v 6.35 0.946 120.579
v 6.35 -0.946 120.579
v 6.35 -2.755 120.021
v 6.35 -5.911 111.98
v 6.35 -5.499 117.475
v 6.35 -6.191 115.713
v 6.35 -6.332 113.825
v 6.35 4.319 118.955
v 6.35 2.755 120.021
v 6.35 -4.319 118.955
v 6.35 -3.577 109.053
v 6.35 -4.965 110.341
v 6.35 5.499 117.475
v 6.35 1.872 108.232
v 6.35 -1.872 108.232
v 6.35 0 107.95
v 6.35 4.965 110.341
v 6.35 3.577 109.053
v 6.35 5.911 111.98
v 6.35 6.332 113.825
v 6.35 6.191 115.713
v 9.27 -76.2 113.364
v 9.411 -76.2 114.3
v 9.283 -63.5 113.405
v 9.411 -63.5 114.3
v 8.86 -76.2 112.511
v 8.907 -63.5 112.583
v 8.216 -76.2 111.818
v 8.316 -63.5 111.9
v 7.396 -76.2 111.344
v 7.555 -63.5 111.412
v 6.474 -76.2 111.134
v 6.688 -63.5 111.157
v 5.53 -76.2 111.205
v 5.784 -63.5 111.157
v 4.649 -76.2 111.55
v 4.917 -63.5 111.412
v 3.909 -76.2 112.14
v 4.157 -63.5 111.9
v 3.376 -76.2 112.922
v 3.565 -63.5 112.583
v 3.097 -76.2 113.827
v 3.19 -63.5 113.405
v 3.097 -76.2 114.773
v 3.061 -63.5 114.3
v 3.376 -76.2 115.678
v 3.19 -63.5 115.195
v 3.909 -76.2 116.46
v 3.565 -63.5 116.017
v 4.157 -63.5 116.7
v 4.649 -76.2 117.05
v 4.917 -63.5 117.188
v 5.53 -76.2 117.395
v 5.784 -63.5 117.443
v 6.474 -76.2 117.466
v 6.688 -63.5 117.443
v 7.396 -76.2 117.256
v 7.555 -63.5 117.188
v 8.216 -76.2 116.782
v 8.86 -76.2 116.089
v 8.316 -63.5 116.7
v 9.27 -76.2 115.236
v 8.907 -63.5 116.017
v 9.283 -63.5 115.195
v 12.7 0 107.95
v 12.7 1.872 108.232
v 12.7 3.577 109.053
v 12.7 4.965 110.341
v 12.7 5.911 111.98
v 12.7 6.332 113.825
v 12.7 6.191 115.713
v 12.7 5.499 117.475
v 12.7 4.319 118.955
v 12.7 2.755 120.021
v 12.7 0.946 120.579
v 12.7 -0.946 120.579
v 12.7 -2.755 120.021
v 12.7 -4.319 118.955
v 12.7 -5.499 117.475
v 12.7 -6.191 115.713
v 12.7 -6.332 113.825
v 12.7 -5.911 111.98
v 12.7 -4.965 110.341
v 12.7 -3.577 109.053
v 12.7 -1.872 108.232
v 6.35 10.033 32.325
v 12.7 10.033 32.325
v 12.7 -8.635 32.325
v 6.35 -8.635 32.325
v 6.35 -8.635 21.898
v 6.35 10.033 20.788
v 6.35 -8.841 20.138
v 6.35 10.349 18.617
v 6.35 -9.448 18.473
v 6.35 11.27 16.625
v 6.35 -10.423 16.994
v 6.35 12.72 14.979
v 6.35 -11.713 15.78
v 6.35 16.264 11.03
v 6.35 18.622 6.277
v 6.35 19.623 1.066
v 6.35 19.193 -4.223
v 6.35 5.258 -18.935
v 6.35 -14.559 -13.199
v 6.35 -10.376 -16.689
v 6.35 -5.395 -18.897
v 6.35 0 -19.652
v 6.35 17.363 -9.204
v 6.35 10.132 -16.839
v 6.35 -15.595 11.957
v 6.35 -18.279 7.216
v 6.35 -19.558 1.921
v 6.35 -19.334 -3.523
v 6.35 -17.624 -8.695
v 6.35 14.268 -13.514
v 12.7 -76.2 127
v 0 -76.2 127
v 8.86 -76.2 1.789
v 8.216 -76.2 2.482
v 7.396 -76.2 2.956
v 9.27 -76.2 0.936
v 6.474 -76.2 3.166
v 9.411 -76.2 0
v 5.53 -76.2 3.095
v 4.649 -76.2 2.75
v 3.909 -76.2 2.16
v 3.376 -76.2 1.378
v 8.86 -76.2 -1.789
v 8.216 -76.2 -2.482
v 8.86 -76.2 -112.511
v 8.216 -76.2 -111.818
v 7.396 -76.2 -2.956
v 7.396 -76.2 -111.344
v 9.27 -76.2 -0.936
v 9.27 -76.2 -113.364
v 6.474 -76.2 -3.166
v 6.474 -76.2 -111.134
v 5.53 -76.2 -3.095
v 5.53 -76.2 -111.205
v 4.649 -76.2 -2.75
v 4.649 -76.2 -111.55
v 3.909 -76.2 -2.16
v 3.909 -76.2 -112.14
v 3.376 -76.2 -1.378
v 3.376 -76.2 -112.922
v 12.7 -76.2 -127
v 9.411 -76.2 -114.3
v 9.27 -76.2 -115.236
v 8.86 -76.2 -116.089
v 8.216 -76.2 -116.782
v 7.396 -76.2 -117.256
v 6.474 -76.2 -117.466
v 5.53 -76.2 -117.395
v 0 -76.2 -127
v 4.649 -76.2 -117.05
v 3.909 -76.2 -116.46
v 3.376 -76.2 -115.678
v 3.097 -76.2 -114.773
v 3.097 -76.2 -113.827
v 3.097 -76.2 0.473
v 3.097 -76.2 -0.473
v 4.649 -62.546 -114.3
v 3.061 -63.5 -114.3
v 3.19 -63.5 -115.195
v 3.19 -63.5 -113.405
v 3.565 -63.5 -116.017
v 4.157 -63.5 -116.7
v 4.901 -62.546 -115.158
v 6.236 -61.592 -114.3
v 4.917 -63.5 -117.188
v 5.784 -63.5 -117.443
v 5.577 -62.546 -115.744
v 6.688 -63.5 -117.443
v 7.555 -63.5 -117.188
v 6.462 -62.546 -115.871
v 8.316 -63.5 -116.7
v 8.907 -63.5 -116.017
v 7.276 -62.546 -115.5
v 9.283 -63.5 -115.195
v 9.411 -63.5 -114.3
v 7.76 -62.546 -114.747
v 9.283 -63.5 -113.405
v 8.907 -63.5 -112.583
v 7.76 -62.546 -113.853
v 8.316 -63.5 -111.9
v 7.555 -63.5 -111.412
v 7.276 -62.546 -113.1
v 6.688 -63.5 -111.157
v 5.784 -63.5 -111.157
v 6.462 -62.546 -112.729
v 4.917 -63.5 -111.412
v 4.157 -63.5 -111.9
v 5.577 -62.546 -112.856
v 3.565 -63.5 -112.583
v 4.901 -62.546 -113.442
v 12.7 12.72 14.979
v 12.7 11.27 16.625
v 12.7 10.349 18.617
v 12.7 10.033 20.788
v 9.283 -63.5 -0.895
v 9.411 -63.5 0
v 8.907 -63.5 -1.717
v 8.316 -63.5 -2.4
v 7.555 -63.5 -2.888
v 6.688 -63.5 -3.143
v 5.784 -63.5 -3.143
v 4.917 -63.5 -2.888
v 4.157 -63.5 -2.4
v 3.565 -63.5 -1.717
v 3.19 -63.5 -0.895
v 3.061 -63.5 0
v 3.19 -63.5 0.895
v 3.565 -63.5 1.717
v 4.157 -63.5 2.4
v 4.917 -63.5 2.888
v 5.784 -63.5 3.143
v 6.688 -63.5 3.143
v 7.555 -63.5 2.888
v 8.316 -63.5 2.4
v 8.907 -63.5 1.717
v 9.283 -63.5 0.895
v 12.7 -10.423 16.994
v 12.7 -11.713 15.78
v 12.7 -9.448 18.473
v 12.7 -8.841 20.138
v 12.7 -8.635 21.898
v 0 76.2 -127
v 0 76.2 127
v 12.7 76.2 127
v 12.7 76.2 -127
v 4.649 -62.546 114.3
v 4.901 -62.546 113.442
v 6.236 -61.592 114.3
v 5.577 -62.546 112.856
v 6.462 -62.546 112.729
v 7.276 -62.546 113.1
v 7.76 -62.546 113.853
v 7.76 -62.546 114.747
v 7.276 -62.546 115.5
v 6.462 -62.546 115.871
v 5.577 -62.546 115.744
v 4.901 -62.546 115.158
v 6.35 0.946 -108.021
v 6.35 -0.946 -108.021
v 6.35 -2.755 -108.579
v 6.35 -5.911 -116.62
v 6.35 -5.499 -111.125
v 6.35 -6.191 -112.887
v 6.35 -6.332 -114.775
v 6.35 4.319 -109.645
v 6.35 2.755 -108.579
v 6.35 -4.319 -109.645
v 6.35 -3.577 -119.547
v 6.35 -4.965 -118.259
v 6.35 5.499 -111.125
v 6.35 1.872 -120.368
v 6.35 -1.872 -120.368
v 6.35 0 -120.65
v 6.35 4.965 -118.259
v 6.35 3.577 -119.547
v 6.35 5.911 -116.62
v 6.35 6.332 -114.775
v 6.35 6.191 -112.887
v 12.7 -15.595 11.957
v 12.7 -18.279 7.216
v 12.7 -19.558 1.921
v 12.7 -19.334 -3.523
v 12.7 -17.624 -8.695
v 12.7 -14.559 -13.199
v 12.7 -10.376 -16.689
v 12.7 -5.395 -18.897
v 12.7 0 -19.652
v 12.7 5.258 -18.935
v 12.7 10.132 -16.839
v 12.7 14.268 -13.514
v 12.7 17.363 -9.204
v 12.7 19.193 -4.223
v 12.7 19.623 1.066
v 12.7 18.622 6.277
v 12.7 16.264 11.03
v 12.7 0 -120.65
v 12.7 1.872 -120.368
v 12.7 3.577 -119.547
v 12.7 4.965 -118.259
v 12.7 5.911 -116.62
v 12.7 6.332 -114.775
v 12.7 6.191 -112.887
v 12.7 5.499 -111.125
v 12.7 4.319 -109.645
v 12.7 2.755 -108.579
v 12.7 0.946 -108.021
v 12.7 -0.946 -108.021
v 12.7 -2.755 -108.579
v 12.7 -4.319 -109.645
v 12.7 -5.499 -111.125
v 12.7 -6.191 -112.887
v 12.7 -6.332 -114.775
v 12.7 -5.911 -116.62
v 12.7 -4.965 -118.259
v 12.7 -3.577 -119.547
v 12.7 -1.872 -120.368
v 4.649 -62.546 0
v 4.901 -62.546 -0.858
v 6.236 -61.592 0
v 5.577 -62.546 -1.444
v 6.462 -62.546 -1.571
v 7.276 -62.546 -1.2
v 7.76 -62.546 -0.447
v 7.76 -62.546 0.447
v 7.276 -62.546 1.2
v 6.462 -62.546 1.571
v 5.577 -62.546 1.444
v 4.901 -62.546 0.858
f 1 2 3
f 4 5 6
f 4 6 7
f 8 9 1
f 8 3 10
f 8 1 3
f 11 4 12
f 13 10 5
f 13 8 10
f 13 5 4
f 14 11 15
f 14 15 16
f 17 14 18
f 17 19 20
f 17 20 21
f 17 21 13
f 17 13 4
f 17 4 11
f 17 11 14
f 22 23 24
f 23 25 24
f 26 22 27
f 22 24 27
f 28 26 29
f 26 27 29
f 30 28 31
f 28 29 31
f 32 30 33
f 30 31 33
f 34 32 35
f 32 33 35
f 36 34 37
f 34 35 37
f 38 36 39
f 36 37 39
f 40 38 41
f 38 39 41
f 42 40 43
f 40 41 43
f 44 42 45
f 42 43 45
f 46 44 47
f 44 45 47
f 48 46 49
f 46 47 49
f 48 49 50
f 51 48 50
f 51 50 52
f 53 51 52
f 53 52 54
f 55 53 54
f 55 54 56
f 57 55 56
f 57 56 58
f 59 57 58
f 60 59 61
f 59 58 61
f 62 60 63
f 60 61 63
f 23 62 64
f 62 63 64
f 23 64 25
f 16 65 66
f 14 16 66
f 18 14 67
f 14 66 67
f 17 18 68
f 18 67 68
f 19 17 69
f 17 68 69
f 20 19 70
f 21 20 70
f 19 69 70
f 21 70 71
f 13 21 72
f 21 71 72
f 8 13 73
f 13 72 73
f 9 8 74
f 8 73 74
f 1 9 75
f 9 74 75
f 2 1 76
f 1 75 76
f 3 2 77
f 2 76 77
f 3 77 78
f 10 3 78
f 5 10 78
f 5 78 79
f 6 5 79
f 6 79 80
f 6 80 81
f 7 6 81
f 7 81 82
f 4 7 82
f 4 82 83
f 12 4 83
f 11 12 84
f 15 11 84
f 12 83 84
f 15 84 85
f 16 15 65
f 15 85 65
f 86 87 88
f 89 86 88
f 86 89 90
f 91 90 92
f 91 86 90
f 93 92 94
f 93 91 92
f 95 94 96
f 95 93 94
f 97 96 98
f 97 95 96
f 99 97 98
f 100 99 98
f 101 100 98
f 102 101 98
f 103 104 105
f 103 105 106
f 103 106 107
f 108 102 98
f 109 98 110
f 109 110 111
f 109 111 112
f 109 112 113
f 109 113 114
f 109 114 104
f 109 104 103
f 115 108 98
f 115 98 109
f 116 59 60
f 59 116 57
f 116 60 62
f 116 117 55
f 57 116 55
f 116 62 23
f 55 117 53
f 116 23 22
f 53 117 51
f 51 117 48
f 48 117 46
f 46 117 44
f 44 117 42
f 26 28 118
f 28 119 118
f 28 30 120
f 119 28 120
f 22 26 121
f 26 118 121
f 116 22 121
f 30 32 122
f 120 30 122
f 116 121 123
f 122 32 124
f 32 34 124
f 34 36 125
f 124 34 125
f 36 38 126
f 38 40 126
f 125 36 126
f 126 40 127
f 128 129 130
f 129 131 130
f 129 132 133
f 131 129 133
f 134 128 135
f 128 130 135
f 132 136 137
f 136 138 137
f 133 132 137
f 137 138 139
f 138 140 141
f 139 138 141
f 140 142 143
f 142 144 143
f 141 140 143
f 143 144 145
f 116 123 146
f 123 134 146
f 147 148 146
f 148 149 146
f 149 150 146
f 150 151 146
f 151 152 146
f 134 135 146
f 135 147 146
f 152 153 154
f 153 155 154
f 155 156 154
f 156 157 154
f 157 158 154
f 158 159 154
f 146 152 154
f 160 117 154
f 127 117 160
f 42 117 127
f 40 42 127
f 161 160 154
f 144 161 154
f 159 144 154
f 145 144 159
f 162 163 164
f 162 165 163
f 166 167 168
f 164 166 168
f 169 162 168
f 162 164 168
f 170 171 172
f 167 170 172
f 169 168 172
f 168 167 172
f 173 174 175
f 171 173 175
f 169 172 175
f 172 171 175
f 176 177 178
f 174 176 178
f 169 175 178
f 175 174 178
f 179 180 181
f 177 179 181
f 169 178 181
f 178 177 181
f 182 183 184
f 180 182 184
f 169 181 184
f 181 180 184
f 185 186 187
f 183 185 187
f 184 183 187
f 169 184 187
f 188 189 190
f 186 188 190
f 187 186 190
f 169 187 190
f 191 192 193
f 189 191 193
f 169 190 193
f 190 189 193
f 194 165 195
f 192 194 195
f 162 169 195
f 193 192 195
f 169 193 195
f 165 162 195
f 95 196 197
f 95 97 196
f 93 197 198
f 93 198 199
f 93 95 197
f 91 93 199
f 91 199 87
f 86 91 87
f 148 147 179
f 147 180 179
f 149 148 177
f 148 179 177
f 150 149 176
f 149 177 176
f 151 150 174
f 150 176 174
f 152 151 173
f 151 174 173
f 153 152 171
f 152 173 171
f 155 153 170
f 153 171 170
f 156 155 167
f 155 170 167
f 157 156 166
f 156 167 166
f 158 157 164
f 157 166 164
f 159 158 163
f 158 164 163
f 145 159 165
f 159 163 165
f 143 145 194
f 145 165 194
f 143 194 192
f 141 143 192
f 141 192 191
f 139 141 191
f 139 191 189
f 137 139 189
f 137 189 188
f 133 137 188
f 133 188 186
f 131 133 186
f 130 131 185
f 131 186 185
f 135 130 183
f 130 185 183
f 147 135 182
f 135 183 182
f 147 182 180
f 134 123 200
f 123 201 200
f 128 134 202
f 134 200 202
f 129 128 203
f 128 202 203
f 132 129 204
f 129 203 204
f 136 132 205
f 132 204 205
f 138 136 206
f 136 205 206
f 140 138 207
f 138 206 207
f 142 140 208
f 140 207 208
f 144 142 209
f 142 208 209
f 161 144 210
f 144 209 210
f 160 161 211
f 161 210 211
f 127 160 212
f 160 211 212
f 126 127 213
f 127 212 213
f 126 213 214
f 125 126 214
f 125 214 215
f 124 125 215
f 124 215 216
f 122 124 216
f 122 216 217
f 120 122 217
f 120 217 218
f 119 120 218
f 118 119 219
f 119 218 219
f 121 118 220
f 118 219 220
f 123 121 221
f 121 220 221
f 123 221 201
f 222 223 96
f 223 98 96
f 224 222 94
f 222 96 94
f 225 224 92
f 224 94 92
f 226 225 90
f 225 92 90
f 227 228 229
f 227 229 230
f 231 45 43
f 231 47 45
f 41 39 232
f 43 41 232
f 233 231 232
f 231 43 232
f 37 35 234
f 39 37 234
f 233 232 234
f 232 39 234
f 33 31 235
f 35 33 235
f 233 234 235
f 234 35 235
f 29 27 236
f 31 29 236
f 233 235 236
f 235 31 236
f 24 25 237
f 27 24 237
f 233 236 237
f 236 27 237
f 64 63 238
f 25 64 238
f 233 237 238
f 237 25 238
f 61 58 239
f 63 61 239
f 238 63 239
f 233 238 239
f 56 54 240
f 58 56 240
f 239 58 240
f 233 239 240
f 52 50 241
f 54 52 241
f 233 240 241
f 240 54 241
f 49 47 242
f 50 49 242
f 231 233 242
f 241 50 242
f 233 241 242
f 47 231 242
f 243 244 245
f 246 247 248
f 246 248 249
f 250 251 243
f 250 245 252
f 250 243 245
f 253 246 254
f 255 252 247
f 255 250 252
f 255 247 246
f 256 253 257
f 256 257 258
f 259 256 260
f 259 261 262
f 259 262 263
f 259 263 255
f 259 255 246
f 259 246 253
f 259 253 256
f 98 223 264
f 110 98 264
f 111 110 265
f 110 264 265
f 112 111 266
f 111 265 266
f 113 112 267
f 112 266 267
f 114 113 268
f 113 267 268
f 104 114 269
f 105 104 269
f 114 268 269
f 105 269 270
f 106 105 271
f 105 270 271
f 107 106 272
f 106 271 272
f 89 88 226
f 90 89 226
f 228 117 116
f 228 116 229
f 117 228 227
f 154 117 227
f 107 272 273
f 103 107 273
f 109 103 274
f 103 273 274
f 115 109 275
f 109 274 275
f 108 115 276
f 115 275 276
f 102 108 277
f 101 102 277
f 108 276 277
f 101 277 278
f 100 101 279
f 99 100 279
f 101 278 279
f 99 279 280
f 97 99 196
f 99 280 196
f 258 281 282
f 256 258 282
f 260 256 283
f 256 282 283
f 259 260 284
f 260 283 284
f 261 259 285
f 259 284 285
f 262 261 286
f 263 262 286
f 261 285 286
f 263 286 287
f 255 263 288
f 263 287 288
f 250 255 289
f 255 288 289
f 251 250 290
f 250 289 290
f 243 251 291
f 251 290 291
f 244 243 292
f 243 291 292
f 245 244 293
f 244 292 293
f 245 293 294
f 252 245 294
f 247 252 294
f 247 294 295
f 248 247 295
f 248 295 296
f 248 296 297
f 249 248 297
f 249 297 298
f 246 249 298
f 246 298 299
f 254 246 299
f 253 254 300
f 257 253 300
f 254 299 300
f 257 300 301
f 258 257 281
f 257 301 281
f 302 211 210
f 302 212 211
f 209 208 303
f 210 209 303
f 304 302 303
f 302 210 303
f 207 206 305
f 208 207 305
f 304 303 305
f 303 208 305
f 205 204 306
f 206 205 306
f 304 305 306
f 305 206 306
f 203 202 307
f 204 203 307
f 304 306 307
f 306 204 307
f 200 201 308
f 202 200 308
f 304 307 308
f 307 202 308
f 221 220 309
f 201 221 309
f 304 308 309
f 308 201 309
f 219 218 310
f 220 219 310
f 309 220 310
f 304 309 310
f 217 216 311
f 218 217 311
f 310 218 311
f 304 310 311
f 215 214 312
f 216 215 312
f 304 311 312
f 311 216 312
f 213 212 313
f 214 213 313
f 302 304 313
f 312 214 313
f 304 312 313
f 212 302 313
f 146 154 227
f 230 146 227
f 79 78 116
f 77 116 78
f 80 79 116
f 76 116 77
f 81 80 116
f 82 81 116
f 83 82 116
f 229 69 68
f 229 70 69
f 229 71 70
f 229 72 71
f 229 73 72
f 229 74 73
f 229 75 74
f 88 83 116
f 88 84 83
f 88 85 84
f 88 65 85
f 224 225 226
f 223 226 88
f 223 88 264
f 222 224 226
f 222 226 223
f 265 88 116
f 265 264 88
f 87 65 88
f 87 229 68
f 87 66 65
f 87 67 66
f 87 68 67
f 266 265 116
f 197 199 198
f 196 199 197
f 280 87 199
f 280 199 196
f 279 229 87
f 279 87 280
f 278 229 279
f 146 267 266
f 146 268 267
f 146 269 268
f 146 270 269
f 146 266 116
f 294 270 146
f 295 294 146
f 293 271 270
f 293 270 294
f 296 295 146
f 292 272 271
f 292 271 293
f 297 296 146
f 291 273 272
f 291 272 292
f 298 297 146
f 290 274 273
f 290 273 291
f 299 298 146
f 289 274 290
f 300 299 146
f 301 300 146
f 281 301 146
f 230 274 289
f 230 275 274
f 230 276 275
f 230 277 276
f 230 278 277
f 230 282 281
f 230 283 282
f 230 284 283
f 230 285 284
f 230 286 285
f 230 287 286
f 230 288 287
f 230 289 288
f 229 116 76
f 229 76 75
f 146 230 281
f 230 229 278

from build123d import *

# Parameters (mm, degrees)
SKETCH1_W                       = 254
SKETCH1_H                       = 152.4
BOSS_EXTRUDE1_DEPTH             = 12.7
SKETCH3_R                       = 6.35
CUT_EXTRUDE2_DEPTH              = 6.35
F_1_4_0_25_DIAMETER_HOLE1_D     = 6.35
F_1_4_0_25_DIAMETER_HOLE1_DEPTH = 12.7
F_1_4_0_25_DIAMETER_HOLE1_TIP   = 1.907732465
CUT_EXTRUDE3_DEPTH              = 6.35
FILLET1_R                       = 7.62


with BuildPart() as part:
    # Sketch1 → Boss-Extrude1 (new body)
    with BuildSketch(Plane(origin=(0, 0, 0), x_dir=(0, 0, -1), z_dir=(1, 0, 0))):
        Rectangle(SKETCH1_W, SKETCH1_H)
    extrude(amount=BOSS_EXTRUDE1_DEPTH)

    # Sketch3 → Cut-Extrude2 (cut)
    with BuildSketch(Plane(origin=(12.7, 0, 0), x_dir=(0, 0, -1), z_dir=(1, 0, 0))):
        with Locations((114.3, 0)):
            Circle(SKETCH3_R)
        with Locations((-114.3, 0)):
            Circle(SKETCH3_R)
    extrude(amount=-CUT_EXTRUDE2_DEPTH, mode=Mode.SUBTRACT)

    # 1/4 (0.25) Diameter Hole1
    with Locations(Plane(origin=(0, -76.2, 0), x_dir=(-1, 0, 0), z_dir=(0, -1, 0))):
        with Locations((-6.236337014, -114.3), (-6.236337014, 0), (-6.236337014, 114.3)):
            Hole(F_1_4_0_25_DIAMETER_HOLE1_D / 2, depth=F_1_4_0_25_DIAMETER_HOLE1_DEPTH)
            with Locations((0, 0, -(F_1_4_0_25_DIAMETER_HOLE1_DEPTH + F_1_4_0_25_DIAMETER_HOLE1_TIP / 2))):  # 118° drill point
                Cone(0, F_1_4_0_25_DIAMETER_HOLE1_D / 2, F_1_4_0_25_DIAMETER_HOLE1_TIP, mode=Mode.SUBTRACT)

    # Sketch7 → Cut-Extrude3 (cut)
    with BuildSketch(Plane(origin=(12.7, 0, 0), x_dir=(0, 0, -1), z_dir=(1, 0, 0))):
        with BuildLine():
            Line((0, 10.032875442), (0, -8.634963037))
            Line((0, -8.634963037), (-17.653050426, -8.634963037))
            ThreePointArc((-17.653050426, -8.634963037), (4.431634546, -19.145584119), (19.651788112, 0))
            ThreePointArc((19.651788112, 0), (5.202001486, 18.950777201), (-16.897756844, 10.032875442))
            Line((-16.897756844, 10.032875442), (0, 10.032875442))
        make_face()
        with BuildLine():
            Line((-17.653050426, -8.634963037), (0, -8.634963037))
            Line((0, -8.634963037), (0, 10.032875442))
            Line((0, 10.032875442), (-16.897756844, 10.032875442))
            ThreePointArc((-16.897756844, 10.032875442), (-19.635723036, 0.79445382), (-17.653050426, -8.634963037))
        make_face()
        with BuildLine():
            Line((-32.324736448, -8.634963037), (-17.653050426, -8.634963037))
            ThreePointArc((-17.653050426, -8.634963037), (-19.635723036, 0.79445382), (-16.897756844, 10.032875442))
            Line((-16.897756844, 10.032875442), (-32.324736448, 10.032875442))
            Line((-32.324736448, 10.032875442), (-32.324736448, -8.634963037))
        make_face()
    extrude(amount=-CUT_EXTRUDE3_DEPTH, mode=Mode.SUBTRACT)

    # Fillet1
    fillet1_edges = [part.edges().sort_by_distance(p)[0] for p in [
        (9.525, 10.032875442, 16.897756844),
        (9.525, -8.634963037, 17.653050426),
    ]]
    fillet(fillet1_edges, radius=FILLET1_R)


solid = part.part
